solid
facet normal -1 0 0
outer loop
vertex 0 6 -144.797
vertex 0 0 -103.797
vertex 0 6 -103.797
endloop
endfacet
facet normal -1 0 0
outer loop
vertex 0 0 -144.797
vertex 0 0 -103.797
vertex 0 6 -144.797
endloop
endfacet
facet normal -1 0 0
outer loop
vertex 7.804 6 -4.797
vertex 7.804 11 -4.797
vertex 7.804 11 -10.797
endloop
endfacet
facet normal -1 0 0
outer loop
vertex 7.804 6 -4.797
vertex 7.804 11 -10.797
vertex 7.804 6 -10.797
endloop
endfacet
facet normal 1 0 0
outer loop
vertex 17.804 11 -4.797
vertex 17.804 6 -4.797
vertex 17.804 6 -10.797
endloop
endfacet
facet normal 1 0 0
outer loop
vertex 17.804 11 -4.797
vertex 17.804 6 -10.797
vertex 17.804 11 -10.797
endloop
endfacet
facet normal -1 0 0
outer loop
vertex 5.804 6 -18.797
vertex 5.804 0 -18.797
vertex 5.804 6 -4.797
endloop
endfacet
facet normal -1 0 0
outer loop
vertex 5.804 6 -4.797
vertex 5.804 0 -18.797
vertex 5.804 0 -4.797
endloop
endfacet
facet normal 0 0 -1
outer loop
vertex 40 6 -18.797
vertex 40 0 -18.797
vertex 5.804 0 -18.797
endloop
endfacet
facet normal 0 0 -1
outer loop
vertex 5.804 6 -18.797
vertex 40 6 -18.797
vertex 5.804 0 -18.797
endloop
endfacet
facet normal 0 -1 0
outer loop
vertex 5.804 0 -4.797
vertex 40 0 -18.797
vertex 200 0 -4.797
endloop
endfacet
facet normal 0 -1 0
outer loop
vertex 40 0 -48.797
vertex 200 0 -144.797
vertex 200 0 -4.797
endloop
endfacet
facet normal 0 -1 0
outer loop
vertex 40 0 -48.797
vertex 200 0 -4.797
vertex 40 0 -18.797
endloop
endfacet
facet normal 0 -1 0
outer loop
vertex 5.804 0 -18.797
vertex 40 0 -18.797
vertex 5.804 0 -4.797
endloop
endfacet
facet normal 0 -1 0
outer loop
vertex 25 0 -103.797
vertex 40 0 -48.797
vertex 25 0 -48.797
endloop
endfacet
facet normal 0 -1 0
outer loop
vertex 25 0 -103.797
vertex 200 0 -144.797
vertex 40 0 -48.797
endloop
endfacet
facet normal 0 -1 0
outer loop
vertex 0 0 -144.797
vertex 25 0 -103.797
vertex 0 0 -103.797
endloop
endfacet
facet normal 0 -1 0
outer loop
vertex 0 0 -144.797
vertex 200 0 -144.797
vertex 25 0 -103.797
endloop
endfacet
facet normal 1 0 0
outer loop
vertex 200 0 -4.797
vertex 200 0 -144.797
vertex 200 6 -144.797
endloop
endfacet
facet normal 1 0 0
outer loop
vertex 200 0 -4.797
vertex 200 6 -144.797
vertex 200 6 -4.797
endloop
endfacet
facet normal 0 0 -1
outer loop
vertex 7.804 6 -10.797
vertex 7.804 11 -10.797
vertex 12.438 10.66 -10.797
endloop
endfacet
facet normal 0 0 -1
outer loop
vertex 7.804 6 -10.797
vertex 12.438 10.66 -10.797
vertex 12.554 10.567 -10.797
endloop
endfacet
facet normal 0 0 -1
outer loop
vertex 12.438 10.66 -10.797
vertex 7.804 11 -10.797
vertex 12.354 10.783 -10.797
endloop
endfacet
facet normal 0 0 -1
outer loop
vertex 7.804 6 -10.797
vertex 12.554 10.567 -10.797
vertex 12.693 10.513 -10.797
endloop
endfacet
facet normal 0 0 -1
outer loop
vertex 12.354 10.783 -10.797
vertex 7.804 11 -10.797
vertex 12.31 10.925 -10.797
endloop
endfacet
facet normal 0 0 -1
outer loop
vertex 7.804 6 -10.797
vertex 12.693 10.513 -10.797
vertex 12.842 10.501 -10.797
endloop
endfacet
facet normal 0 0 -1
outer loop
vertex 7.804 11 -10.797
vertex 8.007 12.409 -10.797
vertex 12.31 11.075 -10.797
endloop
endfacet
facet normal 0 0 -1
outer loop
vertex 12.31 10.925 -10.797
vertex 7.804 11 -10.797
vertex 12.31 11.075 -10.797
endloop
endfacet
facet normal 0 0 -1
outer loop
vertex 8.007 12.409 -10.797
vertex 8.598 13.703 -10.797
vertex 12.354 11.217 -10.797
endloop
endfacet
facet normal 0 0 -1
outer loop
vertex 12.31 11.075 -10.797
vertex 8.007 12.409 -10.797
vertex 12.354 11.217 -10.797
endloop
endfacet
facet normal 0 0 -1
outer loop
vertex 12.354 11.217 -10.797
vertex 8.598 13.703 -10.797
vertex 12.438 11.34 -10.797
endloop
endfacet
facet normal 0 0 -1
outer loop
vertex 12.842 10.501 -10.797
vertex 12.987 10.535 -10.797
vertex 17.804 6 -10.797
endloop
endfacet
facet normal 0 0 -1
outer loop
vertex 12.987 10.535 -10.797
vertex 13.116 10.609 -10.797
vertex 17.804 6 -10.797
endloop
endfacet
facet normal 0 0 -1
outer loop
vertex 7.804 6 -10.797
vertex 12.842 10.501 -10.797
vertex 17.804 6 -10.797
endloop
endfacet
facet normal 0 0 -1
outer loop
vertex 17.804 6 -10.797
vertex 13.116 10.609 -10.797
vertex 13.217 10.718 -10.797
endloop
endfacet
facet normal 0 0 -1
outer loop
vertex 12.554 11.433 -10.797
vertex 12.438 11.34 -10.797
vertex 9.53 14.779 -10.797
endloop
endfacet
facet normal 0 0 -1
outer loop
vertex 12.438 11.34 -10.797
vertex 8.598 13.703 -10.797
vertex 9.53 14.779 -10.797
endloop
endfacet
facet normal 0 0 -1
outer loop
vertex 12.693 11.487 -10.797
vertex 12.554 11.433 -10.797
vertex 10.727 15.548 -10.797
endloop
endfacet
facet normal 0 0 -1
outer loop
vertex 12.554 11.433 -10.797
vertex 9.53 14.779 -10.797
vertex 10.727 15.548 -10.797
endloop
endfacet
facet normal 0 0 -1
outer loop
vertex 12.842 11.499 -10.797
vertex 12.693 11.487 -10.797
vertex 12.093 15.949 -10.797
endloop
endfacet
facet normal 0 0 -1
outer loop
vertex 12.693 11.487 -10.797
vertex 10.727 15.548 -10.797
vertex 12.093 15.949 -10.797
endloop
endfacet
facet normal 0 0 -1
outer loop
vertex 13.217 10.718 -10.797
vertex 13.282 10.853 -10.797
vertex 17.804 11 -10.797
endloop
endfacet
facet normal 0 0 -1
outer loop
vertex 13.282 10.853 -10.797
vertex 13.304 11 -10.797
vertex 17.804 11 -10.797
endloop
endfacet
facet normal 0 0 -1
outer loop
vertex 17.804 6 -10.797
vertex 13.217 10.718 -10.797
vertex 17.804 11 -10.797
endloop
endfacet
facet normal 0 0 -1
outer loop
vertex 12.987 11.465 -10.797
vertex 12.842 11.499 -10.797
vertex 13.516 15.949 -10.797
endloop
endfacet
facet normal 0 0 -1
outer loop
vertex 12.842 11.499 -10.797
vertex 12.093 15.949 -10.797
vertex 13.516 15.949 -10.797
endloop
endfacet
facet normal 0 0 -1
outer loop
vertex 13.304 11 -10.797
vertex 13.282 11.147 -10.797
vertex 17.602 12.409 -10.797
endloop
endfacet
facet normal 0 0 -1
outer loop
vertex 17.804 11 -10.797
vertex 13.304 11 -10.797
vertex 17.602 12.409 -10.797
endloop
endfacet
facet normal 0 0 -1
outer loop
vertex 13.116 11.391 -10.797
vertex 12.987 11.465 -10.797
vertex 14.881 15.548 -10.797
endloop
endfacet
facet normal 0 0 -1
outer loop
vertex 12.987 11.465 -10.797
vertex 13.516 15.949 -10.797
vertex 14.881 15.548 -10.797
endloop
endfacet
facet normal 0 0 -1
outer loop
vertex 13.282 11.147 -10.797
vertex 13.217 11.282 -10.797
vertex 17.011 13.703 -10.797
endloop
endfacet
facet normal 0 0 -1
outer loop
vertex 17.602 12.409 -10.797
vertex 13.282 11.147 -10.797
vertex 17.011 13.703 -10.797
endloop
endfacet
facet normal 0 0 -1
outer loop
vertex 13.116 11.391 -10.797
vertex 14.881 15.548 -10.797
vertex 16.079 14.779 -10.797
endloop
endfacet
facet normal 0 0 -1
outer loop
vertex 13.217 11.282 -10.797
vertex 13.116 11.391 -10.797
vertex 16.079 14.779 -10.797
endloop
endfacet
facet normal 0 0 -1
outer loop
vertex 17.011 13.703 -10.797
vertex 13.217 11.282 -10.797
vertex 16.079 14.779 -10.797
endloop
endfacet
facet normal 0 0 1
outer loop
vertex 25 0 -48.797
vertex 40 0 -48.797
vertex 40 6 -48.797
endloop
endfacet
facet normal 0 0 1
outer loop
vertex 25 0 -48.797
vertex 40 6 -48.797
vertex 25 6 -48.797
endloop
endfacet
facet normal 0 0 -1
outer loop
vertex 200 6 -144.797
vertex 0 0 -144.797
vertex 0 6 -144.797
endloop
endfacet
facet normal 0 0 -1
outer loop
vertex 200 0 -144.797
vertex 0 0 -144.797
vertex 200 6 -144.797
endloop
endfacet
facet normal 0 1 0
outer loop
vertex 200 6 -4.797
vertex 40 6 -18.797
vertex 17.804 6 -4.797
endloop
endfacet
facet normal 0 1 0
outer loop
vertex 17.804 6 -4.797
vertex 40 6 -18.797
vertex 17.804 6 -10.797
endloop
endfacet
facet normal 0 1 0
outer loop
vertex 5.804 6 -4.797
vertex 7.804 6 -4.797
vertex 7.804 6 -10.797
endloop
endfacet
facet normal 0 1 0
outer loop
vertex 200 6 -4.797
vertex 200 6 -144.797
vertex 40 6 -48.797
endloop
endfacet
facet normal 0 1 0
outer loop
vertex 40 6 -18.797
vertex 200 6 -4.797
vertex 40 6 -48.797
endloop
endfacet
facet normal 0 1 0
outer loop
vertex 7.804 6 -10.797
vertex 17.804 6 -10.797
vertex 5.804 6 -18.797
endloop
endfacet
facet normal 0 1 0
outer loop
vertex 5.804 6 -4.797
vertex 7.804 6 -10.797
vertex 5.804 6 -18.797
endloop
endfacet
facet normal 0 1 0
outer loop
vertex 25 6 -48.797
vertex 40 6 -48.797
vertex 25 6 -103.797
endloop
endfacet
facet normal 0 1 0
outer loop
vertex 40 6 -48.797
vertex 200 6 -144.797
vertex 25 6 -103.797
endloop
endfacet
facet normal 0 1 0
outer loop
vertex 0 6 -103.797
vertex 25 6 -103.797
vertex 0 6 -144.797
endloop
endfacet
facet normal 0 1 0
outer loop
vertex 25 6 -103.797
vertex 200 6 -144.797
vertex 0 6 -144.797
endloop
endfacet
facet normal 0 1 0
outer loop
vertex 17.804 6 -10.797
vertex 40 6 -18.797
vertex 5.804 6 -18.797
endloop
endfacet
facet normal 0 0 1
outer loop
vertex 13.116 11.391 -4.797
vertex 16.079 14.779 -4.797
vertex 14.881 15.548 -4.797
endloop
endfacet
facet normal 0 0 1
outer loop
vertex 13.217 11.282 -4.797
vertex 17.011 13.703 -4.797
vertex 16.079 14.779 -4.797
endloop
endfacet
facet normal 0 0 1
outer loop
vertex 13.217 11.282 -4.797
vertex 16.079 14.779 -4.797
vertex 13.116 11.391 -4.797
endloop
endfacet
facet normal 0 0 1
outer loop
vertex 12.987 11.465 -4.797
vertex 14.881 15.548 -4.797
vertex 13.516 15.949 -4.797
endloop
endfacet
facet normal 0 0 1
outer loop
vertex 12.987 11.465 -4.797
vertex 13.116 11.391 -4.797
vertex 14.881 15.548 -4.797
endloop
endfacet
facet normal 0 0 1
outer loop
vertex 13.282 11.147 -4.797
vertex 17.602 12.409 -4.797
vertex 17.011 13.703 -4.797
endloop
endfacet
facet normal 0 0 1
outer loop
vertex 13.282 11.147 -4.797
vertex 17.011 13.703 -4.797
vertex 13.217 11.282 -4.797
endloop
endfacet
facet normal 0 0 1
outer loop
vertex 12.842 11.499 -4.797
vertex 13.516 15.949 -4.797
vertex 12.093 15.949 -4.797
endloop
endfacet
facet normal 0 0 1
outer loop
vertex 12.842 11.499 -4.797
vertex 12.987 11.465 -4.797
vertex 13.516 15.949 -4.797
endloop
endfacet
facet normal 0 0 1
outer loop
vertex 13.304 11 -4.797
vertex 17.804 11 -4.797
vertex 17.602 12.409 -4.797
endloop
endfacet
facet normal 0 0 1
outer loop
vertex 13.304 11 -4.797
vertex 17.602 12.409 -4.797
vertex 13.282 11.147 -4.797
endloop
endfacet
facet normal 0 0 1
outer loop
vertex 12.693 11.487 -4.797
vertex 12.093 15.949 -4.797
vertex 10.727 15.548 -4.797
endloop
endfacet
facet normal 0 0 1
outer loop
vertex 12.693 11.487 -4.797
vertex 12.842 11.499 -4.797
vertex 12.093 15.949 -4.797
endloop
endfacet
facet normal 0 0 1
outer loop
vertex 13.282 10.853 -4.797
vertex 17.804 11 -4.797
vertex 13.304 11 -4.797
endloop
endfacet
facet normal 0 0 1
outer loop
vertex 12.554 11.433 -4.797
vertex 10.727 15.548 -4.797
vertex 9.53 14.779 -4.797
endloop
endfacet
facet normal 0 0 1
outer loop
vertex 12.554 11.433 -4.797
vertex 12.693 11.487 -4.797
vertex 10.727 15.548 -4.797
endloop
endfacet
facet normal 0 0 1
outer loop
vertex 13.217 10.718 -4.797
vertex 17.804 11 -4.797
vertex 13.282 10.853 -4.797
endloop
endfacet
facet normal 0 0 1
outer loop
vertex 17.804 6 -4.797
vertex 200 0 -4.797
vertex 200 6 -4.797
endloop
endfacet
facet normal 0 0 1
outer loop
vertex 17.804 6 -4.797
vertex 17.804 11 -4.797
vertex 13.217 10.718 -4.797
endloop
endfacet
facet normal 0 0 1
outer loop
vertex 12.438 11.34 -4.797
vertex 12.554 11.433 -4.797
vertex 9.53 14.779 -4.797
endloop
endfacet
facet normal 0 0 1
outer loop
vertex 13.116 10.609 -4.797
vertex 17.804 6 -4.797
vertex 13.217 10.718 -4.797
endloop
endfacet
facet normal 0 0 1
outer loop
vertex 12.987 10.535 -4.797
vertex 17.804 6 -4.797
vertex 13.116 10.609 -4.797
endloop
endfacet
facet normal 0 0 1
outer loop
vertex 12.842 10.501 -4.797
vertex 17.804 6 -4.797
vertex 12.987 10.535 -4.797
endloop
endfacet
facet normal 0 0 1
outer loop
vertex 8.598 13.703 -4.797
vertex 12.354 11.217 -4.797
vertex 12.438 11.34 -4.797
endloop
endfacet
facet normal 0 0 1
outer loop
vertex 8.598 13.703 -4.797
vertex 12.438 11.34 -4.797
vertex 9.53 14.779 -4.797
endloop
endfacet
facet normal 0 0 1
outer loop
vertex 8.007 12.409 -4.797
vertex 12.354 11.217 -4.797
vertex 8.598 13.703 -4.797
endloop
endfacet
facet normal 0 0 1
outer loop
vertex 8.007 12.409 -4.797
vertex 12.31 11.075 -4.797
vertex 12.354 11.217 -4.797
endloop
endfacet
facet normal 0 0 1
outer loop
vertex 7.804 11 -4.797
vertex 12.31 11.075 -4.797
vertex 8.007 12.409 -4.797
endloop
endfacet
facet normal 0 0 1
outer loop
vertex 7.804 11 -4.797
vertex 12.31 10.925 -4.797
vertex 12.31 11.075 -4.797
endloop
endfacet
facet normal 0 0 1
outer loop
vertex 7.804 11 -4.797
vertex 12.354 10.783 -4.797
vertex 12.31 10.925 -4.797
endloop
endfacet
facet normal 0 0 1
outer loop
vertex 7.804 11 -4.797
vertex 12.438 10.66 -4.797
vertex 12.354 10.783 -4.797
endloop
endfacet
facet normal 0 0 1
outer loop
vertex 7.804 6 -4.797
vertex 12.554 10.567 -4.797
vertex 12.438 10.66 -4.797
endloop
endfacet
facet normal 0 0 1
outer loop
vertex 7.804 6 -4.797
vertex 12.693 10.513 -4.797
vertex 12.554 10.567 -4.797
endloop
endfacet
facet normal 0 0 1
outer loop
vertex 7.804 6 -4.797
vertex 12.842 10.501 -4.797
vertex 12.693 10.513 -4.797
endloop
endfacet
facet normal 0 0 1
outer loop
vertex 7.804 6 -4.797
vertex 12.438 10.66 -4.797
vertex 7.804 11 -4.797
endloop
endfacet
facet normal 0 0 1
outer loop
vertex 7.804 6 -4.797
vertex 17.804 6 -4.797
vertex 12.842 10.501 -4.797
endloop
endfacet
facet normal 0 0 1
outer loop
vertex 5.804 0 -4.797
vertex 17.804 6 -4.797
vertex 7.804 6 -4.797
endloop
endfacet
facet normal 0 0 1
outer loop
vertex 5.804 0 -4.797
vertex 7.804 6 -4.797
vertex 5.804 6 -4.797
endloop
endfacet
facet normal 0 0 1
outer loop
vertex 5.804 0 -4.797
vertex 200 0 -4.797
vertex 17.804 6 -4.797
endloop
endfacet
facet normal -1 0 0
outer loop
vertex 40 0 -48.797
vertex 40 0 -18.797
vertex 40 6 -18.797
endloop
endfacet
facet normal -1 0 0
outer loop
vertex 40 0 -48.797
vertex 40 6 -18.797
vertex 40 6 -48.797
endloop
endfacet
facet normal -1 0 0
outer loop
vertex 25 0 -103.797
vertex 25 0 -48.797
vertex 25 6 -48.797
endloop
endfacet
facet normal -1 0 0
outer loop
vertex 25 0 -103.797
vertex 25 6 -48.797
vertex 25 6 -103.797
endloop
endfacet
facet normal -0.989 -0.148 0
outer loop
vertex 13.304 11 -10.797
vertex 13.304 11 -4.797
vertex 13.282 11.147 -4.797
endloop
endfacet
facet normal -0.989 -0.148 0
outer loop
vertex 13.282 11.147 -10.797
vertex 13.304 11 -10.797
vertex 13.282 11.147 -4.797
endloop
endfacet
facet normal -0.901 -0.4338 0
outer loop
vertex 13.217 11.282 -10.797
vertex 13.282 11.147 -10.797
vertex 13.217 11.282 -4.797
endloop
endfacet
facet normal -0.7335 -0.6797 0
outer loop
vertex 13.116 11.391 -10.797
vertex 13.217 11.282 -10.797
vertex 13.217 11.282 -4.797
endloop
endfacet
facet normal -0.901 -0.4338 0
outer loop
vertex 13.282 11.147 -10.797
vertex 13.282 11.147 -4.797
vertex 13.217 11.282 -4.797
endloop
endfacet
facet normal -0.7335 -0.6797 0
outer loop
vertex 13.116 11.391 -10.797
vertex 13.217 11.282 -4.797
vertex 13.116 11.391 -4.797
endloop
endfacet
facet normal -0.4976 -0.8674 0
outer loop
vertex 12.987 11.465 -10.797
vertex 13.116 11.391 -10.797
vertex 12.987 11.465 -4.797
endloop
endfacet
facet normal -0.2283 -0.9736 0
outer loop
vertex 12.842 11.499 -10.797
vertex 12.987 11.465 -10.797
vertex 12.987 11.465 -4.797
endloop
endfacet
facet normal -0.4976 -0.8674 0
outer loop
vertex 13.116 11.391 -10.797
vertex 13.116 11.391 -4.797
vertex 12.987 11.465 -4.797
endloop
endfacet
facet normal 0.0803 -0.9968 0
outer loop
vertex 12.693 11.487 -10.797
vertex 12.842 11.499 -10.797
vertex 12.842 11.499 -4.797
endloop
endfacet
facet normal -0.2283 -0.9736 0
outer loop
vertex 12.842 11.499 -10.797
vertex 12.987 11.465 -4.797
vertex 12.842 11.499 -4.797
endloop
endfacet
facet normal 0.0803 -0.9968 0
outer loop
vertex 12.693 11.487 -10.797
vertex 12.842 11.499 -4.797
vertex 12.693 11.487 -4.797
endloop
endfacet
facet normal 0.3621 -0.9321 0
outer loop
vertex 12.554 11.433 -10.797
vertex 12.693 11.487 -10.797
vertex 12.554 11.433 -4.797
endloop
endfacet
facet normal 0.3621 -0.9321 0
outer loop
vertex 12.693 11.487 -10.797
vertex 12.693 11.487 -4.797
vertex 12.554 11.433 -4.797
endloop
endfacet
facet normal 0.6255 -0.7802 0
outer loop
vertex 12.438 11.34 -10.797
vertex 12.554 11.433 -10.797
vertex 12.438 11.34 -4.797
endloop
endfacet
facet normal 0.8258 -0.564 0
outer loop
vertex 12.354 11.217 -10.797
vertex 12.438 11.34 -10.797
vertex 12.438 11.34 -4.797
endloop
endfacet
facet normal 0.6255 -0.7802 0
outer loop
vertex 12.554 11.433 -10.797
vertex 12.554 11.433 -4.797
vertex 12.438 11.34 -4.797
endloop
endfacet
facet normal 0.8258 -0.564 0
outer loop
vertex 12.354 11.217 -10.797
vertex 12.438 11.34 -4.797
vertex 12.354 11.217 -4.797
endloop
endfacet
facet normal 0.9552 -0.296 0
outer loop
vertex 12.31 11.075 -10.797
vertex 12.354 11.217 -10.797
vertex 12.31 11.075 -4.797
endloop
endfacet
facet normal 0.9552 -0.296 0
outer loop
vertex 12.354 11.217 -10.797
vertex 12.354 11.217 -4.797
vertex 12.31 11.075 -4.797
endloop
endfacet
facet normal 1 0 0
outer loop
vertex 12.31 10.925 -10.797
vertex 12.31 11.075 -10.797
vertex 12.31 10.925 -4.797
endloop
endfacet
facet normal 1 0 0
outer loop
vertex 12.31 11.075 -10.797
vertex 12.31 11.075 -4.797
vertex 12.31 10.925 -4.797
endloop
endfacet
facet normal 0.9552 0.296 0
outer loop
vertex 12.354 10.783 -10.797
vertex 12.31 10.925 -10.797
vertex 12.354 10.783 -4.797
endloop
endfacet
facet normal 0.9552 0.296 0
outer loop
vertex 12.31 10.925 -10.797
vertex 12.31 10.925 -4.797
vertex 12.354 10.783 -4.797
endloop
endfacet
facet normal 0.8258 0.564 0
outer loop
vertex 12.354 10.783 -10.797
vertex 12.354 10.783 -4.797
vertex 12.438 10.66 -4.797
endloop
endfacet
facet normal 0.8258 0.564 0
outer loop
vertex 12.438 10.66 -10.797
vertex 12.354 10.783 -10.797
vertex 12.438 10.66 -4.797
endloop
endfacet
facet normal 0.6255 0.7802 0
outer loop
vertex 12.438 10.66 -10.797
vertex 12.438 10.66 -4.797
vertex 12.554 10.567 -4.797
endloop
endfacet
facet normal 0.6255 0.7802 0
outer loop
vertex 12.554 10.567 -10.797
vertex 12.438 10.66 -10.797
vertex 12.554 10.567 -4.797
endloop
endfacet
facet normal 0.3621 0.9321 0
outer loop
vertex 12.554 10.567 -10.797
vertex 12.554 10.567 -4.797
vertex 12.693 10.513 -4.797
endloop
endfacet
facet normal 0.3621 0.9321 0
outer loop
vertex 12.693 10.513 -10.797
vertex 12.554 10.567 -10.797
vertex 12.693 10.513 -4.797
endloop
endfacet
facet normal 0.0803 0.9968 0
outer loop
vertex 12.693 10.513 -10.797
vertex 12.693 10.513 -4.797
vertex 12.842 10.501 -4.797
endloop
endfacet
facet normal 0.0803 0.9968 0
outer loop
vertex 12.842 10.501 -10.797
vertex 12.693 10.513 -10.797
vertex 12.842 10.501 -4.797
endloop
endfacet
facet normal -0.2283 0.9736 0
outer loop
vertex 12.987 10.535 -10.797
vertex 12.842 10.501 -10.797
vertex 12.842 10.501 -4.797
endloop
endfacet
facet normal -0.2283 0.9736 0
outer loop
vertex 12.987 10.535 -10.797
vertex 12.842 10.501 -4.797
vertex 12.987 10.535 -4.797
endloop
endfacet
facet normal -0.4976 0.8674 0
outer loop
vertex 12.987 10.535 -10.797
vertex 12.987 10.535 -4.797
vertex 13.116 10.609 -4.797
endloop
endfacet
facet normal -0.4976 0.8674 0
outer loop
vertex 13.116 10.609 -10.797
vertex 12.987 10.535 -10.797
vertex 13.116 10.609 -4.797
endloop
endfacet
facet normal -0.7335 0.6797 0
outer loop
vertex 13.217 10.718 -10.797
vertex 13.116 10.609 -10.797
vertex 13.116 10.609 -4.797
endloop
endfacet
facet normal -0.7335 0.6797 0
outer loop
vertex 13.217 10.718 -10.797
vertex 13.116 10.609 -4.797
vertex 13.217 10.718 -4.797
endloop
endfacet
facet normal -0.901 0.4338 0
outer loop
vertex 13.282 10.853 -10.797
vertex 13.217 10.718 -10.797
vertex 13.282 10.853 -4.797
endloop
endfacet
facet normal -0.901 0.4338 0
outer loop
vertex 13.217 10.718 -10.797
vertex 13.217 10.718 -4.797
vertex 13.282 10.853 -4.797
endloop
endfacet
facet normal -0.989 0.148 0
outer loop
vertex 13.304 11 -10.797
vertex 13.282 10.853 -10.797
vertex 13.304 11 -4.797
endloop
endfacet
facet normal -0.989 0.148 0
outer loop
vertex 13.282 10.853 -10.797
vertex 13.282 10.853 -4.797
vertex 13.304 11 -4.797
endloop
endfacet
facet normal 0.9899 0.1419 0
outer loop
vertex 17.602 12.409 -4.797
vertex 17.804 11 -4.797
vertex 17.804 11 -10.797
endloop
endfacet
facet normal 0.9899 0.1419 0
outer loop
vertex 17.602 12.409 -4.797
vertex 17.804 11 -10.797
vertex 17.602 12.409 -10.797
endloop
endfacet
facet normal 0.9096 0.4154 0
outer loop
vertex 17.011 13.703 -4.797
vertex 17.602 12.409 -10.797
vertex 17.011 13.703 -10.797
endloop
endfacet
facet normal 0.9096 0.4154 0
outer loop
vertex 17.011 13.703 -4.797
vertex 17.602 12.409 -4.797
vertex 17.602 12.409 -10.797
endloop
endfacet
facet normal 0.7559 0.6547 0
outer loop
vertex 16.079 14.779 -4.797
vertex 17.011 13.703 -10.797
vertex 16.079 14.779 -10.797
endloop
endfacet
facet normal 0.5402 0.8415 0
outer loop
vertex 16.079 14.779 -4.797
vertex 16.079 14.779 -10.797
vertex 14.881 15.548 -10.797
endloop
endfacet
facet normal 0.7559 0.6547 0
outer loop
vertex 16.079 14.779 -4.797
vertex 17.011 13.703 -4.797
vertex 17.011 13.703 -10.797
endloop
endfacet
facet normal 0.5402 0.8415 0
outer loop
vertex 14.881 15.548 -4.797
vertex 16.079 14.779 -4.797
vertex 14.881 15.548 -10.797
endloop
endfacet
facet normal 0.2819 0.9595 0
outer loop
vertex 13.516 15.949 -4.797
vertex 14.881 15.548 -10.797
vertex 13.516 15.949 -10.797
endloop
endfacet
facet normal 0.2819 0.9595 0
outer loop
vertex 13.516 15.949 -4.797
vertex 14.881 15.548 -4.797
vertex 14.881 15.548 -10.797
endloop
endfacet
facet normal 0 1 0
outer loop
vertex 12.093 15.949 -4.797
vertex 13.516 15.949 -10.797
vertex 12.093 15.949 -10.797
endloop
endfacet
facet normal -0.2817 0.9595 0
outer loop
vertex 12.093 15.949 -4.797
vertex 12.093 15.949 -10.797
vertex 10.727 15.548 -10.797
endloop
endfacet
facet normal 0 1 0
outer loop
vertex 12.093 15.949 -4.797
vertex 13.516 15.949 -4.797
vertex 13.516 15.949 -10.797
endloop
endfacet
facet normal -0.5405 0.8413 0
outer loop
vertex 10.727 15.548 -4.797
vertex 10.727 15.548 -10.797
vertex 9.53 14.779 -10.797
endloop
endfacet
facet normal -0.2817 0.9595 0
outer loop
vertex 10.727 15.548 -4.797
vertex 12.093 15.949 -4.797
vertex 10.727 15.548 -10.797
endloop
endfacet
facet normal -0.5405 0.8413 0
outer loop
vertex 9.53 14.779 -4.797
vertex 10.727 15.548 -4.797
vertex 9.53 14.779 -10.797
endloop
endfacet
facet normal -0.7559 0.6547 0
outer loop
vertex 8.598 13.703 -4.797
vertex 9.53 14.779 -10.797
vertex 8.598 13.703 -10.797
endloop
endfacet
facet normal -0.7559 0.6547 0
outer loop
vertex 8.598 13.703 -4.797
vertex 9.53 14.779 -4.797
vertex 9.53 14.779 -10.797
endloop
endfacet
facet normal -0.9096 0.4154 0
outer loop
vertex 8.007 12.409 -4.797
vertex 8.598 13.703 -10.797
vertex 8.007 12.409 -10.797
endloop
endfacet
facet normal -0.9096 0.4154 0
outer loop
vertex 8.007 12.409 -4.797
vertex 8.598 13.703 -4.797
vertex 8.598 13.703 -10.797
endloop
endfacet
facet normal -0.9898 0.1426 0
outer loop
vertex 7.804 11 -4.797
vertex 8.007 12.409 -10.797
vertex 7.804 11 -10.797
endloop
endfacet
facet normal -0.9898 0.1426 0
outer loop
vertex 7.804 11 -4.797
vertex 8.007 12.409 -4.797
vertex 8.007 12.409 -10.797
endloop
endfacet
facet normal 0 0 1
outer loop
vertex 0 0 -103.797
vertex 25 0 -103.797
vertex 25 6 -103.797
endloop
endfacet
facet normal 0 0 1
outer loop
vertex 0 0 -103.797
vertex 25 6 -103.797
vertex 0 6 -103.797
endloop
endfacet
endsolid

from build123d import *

# Parameters (mm, degrees)
BOSS_EXTRUDE1_DEPTH = 6
SKETCH2_R           = 0.5
BOSS_EXTRUDE2_DEPTH = 6


with BuildPart() as part:
    # Sketch1 → Boss-Extrude1 (new body)
    with BuildSketch(Plane(origin=(0, 0, 0), x_dir=(1, 0, 0), z_dir=(0, 1, 0))):
        Polygon((5.804365786, 4.796692747), (5.804365786, 10.796692747), (5.804365786, 18.796692747), (18.804365786, 18.796692747), (25, 18.796692747), (40, 18.796692747), (40, 48.796692747), (25, 48.796692747), (25, 103.796692747), (0, 103.796692747), (0, 144.796692747), (200, 144.796692747), (200, 4.796692747), align=None)
    extrude(amount=BOSS_EXTRUDE1_DEPTH)

    # Sketch2 → Boss-Extrude2 (add)
    with BuildSketch(Plane.XY.offset(-4.796692747)):
        with BuildLine():
            Line((7.804365786, 6), (17.804365786, 6))
            Line((17.804365786, 6), (17.804365786, 11))
            ThreePointArc((17.804365786, 11), (12.804365786, 16), (7.804365786, 11))
            Line((7.804365786, 11), (7.804365786, 6))
        make_face()
        with Locations((12.804365786, 11)):
            Circle(SKETCH2_R, mode=Mode.SUBTRACT)
    extrude(amount=-BOSS_EXTRUDE2_DEPTH)


solid = part.part
